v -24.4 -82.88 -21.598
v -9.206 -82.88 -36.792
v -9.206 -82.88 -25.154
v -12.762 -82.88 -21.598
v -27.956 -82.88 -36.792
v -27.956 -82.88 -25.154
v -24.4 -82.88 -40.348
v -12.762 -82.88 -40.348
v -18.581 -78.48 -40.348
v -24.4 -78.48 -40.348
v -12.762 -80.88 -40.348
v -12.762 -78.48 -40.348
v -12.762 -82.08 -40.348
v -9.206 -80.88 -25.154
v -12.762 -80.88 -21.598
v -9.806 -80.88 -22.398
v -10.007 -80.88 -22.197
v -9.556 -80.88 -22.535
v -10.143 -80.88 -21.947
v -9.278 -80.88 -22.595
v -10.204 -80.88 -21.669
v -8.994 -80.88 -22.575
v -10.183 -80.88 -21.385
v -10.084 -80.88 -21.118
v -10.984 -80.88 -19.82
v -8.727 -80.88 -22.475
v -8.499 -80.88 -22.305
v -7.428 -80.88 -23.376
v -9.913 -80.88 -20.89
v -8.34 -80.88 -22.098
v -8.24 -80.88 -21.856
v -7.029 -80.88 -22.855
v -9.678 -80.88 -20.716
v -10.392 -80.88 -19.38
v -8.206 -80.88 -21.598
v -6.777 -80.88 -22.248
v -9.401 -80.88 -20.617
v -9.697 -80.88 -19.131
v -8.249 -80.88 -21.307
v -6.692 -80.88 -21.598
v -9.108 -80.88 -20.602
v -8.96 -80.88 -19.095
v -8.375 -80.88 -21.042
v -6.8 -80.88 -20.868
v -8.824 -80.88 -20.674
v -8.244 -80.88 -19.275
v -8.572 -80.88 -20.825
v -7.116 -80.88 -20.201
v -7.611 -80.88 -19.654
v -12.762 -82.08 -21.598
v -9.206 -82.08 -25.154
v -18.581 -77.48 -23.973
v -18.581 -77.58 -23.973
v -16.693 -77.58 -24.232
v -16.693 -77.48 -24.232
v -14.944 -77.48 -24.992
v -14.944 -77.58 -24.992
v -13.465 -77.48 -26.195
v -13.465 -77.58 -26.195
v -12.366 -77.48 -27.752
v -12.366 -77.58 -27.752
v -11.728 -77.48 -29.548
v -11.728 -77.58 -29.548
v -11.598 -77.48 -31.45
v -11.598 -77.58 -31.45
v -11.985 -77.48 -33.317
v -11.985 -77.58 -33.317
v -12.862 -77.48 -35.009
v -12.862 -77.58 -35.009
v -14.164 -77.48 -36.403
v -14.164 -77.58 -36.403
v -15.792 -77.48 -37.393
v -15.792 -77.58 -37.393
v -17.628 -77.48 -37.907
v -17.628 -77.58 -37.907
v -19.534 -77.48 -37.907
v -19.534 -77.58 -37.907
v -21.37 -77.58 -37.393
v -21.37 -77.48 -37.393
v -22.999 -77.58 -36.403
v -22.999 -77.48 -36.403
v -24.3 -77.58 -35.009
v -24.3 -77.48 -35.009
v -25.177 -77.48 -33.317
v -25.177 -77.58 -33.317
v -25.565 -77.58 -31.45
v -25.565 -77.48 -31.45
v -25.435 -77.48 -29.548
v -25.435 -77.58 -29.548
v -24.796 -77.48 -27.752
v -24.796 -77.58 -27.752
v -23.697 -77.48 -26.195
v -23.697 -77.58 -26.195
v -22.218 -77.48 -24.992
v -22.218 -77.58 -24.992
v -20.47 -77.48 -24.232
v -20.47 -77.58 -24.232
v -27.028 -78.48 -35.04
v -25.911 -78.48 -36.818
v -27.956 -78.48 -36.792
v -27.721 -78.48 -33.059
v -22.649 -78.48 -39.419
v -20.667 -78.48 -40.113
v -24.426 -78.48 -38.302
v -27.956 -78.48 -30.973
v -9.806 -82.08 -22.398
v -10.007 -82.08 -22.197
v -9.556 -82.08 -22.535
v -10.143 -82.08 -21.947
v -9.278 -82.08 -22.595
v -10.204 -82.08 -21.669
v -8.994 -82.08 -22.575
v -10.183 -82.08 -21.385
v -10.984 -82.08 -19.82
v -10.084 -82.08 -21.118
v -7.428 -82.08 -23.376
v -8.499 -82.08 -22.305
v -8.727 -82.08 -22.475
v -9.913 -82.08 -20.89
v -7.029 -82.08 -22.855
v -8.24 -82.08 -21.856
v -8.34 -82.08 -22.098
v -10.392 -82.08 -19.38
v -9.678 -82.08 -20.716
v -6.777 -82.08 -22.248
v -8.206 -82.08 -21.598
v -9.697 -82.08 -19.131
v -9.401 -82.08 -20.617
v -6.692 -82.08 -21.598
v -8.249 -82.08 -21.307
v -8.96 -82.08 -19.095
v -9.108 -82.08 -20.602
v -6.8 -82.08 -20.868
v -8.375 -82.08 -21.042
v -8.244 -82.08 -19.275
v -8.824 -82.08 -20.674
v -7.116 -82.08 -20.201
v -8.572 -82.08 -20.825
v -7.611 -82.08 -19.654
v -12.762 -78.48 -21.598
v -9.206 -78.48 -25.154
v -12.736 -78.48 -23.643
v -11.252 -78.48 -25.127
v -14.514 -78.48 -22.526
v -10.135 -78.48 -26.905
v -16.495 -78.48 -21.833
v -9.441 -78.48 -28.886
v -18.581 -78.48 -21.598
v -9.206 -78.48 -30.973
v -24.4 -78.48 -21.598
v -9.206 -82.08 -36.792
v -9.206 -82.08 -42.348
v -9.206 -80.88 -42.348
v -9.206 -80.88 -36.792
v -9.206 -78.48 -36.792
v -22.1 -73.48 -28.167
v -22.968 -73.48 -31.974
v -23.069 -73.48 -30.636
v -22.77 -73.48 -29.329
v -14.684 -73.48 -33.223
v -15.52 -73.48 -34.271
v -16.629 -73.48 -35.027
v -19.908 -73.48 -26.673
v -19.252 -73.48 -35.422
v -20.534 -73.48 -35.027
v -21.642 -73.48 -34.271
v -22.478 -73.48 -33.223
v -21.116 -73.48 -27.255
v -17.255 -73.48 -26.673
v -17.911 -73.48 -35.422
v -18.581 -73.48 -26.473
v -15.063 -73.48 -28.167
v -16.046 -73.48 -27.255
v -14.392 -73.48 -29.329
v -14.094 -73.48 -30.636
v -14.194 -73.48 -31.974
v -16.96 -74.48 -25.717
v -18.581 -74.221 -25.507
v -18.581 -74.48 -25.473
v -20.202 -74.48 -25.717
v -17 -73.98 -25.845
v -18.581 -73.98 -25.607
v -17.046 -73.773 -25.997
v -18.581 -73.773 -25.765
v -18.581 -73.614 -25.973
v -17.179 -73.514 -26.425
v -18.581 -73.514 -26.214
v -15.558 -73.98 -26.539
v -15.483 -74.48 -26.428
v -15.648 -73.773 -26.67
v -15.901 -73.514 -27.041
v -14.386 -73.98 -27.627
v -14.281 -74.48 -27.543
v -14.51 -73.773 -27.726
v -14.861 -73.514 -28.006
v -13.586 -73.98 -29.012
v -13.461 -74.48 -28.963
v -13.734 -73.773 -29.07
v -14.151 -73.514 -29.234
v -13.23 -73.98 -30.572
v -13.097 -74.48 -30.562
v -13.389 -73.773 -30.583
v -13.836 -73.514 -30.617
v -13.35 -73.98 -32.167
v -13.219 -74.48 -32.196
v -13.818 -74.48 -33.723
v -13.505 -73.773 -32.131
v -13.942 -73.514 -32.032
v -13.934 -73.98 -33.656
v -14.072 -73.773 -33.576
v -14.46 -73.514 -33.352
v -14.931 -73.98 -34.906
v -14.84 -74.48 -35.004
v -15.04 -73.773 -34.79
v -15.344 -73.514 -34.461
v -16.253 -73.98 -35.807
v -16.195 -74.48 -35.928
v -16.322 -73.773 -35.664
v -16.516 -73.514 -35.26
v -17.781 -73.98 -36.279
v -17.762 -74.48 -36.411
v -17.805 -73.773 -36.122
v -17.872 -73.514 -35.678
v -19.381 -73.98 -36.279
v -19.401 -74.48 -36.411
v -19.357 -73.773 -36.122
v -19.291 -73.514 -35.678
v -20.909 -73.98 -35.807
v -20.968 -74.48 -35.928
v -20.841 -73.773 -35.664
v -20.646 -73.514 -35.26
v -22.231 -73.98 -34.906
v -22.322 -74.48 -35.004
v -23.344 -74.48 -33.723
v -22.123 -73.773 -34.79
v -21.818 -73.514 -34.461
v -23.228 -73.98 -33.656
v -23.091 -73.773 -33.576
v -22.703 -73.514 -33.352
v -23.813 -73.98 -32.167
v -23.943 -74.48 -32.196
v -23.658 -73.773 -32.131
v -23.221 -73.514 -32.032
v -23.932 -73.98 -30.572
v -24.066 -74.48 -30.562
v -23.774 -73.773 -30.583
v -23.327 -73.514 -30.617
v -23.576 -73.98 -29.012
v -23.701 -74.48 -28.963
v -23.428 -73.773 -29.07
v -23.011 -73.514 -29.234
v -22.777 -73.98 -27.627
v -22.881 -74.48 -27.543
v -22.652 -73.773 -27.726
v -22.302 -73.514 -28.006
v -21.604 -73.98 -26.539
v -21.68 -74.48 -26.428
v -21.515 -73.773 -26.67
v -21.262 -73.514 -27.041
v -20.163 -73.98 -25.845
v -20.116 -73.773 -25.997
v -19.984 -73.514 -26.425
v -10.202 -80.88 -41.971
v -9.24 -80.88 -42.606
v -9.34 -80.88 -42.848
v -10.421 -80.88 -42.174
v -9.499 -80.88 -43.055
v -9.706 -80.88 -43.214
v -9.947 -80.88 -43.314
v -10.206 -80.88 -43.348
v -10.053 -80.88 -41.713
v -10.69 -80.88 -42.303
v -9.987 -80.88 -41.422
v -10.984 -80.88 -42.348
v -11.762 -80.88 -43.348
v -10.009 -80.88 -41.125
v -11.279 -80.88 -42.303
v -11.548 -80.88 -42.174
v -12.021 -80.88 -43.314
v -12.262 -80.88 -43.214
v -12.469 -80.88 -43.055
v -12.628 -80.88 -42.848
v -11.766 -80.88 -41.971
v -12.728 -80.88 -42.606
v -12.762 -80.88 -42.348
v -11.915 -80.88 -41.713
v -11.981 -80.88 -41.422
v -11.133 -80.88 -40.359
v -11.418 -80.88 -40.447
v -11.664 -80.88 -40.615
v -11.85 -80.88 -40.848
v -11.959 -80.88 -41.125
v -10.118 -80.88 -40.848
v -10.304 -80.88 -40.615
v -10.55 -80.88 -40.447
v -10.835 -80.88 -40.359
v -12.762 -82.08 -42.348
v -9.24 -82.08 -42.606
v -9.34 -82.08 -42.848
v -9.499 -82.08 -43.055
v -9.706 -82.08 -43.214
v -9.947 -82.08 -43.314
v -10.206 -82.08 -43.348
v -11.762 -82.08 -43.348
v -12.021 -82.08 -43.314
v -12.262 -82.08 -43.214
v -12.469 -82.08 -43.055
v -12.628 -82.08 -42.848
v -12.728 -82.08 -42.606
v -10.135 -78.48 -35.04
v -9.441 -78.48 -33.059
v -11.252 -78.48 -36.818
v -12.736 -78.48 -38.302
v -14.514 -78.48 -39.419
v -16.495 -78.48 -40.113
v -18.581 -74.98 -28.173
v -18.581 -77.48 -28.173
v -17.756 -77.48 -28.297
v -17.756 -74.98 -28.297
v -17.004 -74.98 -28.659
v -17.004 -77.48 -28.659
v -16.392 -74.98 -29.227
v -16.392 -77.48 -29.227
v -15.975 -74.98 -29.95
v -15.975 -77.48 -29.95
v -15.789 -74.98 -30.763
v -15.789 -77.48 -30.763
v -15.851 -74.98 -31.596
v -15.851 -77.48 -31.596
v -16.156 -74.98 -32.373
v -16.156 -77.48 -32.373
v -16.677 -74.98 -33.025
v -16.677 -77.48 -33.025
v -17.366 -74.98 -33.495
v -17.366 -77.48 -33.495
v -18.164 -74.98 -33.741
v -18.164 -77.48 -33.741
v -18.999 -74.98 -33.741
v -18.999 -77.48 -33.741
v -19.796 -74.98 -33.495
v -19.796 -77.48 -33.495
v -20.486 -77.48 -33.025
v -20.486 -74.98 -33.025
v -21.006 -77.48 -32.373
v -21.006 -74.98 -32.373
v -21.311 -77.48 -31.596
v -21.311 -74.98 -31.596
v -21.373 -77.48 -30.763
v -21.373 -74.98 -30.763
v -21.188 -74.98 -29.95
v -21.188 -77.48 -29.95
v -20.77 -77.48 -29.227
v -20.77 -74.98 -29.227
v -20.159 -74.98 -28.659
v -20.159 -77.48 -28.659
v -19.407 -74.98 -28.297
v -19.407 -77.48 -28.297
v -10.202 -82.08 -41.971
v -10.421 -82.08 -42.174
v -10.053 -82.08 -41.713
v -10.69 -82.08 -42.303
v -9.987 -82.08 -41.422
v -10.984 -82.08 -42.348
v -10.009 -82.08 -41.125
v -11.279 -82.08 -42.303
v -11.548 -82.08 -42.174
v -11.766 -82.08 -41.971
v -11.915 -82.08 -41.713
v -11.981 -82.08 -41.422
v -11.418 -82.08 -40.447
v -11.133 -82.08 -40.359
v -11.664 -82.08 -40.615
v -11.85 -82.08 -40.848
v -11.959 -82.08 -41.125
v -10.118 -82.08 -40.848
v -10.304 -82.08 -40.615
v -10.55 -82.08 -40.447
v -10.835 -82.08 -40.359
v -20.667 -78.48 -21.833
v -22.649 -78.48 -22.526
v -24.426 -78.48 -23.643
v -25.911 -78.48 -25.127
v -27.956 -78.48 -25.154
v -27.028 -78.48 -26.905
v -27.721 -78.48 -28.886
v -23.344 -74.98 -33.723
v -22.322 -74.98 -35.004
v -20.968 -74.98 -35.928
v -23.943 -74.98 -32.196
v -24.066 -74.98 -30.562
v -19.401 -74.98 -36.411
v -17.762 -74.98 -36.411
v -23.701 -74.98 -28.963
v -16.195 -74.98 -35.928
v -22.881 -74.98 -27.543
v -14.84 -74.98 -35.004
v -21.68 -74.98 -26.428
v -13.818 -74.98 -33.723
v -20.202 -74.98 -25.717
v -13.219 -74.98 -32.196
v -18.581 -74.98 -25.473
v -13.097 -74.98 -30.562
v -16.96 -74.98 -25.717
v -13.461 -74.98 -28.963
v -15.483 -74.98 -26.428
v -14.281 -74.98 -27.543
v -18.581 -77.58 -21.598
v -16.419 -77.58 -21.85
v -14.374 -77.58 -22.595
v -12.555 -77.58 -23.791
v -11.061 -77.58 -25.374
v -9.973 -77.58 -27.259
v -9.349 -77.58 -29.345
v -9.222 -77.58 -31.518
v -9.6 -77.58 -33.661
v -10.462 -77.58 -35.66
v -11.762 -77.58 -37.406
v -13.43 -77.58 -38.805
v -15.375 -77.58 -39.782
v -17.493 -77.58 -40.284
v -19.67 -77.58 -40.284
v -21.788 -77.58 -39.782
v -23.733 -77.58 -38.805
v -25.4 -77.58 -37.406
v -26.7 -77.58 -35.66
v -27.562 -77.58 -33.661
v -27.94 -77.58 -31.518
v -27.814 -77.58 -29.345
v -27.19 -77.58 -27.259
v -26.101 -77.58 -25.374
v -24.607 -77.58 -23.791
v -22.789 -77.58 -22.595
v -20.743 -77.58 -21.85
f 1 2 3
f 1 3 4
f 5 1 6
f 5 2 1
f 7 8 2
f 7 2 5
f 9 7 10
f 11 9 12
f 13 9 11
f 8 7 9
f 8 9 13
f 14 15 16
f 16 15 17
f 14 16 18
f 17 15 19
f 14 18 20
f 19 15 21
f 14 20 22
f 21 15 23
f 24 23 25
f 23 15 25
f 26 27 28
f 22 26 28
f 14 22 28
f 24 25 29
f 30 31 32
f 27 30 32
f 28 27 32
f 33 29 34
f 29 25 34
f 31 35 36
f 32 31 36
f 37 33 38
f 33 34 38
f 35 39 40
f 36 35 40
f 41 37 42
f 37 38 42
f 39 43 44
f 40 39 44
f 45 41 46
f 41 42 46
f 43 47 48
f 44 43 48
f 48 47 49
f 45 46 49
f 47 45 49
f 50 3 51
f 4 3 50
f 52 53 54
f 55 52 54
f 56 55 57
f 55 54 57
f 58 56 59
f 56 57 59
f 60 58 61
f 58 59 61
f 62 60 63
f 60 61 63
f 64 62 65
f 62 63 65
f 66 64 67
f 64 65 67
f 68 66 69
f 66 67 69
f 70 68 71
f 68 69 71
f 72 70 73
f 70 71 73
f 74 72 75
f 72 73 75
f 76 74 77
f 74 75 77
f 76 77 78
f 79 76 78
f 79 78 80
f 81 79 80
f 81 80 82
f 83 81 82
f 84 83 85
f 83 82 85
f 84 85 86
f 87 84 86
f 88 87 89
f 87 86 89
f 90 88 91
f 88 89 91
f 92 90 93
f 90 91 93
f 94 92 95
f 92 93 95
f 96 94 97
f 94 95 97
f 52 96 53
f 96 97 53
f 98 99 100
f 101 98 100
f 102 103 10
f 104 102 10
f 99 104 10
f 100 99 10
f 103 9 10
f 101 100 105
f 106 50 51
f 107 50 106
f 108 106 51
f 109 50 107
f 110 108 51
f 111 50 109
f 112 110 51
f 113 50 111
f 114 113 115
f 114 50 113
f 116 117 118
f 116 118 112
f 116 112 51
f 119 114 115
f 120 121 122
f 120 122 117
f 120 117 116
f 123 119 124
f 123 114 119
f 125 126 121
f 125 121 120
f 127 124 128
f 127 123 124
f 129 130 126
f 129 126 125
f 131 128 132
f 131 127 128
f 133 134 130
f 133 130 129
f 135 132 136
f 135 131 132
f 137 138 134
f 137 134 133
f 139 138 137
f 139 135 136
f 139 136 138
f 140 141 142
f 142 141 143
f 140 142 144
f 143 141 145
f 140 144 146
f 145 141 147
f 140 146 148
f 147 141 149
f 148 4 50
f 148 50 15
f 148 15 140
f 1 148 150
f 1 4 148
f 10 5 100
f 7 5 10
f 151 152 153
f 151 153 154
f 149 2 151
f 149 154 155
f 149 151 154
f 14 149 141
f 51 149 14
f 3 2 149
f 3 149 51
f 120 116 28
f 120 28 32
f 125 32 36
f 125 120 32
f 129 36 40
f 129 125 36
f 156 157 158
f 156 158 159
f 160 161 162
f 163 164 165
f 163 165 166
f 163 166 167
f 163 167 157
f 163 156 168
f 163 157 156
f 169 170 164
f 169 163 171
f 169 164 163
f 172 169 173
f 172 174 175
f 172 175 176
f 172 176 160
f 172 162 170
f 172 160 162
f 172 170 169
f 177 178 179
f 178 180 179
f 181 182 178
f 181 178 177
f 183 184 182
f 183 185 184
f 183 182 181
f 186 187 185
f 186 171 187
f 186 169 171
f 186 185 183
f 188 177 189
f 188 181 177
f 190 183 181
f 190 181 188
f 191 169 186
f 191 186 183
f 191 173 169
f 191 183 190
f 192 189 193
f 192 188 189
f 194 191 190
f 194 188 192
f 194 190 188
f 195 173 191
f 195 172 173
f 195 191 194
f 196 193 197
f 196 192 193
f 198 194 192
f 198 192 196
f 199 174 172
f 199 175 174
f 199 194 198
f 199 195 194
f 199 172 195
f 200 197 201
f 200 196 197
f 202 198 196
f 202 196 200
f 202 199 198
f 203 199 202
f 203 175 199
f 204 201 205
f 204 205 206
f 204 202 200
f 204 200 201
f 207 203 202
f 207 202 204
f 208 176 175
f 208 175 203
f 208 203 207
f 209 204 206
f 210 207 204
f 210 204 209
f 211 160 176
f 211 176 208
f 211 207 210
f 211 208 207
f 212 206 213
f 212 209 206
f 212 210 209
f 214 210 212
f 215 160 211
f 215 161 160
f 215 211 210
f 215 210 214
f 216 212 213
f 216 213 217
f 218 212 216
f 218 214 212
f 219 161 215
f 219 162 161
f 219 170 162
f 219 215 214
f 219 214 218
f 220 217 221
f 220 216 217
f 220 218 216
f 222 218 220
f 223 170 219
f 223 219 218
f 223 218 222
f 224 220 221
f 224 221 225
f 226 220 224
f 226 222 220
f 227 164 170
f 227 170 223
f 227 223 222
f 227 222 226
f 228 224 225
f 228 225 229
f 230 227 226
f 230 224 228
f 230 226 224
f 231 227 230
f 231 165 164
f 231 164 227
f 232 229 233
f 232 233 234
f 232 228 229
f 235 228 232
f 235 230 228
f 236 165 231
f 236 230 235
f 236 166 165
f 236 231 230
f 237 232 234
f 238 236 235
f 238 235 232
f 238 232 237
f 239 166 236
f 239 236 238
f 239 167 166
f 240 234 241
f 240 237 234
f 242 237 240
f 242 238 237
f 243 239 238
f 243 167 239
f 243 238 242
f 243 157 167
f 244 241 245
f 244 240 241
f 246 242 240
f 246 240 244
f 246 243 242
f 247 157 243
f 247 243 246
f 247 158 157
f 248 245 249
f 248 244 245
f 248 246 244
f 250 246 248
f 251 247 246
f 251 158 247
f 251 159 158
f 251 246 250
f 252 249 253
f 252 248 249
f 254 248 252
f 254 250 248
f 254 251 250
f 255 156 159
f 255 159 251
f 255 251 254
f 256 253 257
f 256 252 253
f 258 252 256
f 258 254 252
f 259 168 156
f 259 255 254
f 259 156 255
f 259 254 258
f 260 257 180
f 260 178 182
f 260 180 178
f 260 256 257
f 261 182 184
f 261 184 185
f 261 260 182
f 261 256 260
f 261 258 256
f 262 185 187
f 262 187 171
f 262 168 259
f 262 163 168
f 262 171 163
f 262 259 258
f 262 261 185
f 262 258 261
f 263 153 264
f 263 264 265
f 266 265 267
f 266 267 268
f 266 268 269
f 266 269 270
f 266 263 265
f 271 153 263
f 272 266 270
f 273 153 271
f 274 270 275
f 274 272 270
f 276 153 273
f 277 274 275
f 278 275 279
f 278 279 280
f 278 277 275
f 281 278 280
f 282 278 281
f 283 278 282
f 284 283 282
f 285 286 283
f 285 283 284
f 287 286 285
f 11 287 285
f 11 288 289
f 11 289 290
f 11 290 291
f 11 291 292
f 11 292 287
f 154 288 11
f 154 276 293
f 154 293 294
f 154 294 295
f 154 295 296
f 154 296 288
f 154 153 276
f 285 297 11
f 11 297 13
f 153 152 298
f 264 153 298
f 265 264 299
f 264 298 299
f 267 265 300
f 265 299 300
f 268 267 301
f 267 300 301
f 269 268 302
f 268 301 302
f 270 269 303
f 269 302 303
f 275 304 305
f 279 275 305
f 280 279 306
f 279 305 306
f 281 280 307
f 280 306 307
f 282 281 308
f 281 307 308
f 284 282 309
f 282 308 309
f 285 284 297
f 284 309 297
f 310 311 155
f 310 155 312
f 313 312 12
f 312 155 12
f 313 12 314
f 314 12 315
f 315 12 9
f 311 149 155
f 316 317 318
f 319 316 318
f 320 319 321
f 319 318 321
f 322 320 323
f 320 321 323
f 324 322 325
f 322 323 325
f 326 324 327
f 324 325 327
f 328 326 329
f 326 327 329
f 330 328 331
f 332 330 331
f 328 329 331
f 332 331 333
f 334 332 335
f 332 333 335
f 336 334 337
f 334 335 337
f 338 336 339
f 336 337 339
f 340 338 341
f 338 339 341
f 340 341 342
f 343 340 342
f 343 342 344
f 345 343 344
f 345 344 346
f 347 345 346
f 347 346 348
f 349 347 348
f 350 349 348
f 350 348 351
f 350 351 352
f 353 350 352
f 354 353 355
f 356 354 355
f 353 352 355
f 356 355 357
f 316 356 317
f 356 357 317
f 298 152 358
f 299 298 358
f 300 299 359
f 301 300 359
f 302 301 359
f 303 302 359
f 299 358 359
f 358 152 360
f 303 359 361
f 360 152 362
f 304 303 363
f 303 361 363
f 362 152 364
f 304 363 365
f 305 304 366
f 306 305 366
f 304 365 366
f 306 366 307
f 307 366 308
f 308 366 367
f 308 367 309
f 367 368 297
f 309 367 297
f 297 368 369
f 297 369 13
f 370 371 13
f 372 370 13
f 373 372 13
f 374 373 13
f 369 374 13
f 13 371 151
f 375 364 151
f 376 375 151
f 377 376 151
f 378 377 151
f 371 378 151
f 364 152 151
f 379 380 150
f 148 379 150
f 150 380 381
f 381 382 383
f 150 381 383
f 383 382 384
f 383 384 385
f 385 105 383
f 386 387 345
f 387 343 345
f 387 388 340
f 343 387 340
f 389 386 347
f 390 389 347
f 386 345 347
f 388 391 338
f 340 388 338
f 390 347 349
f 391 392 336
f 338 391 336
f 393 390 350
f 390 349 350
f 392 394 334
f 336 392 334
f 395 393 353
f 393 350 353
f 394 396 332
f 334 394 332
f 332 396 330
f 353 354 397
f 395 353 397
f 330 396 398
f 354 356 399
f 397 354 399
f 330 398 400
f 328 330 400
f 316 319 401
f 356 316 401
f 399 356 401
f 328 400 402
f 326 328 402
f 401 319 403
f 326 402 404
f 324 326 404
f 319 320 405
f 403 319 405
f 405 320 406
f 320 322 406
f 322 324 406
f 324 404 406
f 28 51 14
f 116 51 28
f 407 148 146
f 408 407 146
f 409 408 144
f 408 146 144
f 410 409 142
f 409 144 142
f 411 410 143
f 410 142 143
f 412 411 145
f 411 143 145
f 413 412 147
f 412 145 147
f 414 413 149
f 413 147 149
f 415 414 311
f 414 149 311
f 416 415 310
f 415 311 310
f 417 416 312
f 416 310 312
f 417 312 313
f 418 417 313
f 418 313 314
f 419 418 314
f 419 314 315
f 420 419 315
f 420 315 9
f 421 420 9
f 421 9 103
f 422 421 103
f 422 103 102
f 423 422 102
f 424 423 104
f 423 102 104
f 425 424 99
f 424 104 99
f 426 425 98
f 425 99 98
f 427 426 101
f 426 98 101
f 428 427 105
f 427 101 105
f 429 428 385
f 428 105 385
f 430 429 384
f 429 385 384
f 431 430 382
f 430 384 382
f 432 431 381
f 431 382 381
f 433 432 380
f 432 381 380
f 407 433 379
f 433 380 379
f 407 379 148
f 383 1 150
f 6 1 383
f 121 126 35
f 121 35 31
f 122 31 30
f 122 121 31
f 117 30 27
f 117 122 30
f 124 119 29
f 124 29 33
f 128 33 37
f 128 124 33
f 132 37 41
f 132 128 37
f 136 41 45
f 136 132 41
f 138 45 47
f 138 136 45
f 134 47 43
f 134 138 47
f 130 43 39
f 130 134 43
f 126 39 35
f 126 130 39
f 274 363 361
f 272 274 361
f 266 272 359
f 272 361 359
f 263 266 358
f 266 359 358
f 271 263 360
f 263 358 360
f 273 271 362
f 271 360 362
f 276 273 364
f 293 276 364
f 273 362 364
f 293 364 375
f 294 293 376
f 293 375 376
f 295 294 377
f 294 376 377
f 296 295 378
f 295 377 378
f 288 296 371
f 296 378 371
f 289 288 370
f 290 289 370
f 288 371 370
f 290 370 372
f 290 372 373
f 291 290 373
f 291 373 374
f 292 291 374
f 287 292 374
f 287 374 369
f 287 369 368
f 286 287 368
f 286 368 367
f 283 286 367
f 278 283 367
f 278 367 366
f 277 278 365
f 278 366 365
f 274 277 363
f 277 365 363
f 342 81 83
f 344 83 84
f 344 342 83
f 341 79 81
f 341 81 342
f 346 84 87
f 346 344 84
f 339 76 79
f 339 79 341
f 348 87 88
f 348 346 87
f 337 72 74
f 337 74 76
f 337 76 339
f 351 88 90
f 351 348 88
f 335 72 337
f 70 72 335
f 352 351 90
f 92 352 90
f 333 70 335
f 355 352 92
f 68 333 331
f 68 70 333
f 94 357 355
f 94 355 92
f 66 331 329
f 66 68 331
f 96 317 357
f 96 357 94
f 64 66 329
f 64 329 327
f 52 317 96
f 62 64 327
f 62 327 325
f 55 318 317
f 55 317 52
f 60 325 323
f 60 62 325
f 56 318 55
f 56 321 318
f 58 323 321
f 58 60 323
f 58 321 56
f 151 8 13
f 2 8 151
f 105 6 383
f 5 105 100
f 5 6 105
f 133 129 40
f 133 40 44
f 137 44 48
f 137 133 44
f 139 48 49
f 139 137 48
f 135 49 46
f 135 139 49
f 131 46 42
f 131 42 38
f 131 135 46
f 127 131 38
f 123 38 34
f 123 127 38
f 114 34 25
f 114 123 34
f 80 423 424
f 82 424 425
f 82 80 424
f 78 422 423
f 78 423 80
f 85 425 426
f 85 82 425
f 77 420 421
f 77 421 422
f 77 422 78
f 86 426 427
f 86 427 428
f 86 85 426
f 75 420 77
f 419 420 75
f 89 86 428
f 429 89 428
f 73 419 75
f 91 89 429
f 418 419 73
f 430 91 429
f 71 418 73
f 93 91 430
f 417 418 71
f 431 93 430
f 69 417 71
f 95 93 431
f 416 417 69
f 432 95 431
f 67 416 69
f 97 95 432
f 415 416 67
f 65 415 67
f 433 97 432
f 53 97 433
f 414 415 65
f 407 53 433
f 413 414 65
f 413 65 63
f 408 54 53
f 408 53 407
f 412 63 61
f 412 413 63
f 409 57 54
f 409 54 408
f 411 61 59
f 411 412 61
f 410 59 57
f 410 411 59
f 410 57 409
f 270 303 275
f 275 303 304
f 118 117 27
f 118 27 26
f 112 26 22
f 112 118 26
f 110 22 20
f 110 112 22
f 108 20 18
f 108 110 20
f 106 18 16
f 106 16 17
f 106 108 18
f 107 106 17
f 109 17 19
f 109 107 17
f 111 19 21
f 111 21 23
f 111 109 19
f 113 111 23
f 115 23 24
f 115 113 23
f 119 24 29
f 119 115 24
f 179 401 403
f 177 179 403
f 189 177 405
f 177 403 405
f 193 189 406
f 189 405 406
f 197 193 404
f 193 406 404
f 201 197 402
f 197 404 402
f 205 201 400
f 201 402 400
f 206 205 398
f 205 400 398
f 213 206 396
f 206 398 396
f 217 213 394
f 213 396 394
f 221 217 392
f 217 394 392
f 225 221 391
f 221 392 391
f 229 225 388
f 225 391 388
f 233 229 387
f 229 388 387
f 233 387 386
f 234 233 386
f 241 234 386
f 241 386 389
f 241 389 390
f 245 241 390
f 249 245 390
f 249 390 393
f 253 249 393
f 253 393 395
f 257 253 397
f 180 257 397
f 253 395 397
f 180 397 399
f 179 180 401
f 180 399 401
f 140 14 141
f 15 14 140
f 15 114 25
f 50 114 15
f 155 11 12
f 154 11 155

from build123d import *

# Parameters (mm, degrees)
BOSS_EXTRUDE1_DEPTH = 4.4
SKETCH2_R           = 9.375
BOSS_EXTRUDE2_DEPTH = 0.9
SKETCH3_R           = 7
BOSS_EXTRUDE3_DEPTH = 0.1
SKETCH4_R           = 2.8
BOSS_EXTRUDE4_DEPTH = 2.5
SKETCH5_R           = 5.5
BOSS_EXTRUDE5_DEPTH = 1.5
FILLET1_R           = 1
BOSS_EXTRUDE6_START = -0.8
BOSS_EXTRUDE6_DEPTH = 1.2
SKETCH7_R           = 1
BOSS_EXTRUDE7_DEPTH = 1.2


with BuildPart() as part:
    # Sketch1 → Boss-Extrude1 (new body)
    with BuildSketch(Plane(origin=(-40.787368979, -82.87971859, -2.365032328), x_dir=(1, 0, 0), z_dir=(0, 1, 0))):
        Polygon((28.025105958, 37.98255848), (31.581105958, 34.42655848), (31.581105958, 22.78855848), (28.025105958, 19.23255848), (16.387105958, 19.23255848), (12.831105958, 22.78855848), (12.831105958, 34.42655848), (16.387105958, 37.98255848), align=None)
    extrude(amount=BOSS_EXTRUDE1_DEPTH)

    # Sketch2 → Boss-Extrude2 (add)
    with BuildSketch(Plane(origin=(0, -78.47971859, 0), x_dir=(1, 0, 0), z_dir=(0, 1, 0))):
        with Locations(Location((-18.581263021, 30.972590809, 0), (0, 0, 270))):
            Circle(SKETCH2_R)
    extrude(amount=BOSS_EXTRUDE2_DEPTH)

    # Sketch3 → Boss-Extrude3 (add)
    with BuildSketch(Plane(origin=(0, -77.57971859, 0), x_dir=(1, 0, 0), z_dir=(0, 1, 0))):
        with Locations(Location((-18.581263021, 30.972590809, 0), (0, 0, 270))):
            Circle(SKETCH3_R)
    extrude(amount=BOSS_EXTRUDE3_DEPTH)

    # Sketch4 → Boss-Extrude4 (add)
    with BuildSketch(Plane(origin=(0, -77.47971859, 0), x_dir=(1, 0, 0), z_dir=(0, 1, 0))):
        with Locations(Location((-18.581263021, 30.972590809, 0), (0, 0, 270))):
            Circle(SKETCH4_R)
    extrude(amount=BOSS_EXTRUDE4_DEPTH)

    # Sketch5 → Boss-Extrude5 (add)
    with BuildSketch(Plane(origin=(0, -74.97971859, 0), x_dir=(1, 0, 0), z_dir=(0, 1, 0))):
        with Locations(Location((-18.581263021, 30.972590809, 0), (0, 0, 270))):
            Circle(SKETCH5_R)
    extrude(amount=BOSS_EXTRUDE5_DEPTH)

    # Fillet1
    fillet1_edges = [part.edges().sort_by_distance(p)[0] for p in [
        (-18.581263021, -73.47971859, -36.472590809),
    ]]
    fillet(fillet1_edges, radius=FILLET1_R)

    # Sketch6 → Boss-Extrude6 (add)
    with BuildSketch(Plane.XZ.offset(82.87971859).offset(BOSS_EXTRUDE6_START)):
        with BuildLine():
            ThreePointArc((-6.691791307, -21.597590809), (-8.244016355, -19.274521857), (-10.984263021, -19.819590809))
            Line((-10.984263021, -19.819590809), (-9.913369802, -20.890484027))
            ThreePointArc((-9.913369802, -20.890484027), (-8.823579589, -20.673711276), (-8.206263021, -21.597590809))
            ThreePointArc((-8.206263021, -21.597590809), (-8.282383489, -21.980274241), (-8.49915624, -22.30469759))
            Line((-8.49915624, -22.30469759), (-7.428263021, -23.375590809))
            ThreePointArc((-7.428263021, -23.375590809), (-6.88319407, -22.559837475), (-6.691791307, -21.597590809))
        make_face()
        with BuildLine():
            Line((-9.913369802, -20.890484027), (-10.984263021, -19.819590809))
            ThreePointArc((-10.984263021, -19.819590809), (-11.720734735, -21.597590809), (-10.984263021, -23.375590809))
            ThreePointArc((-10.984263021, -23.375590809), (-9.206263021, -24.112062522), (-7.428263021, -23.375590809))
            Line((-7.428263021, -23.375590809), (-8.49915624, -22.30469759))
            ThreePointArc((-8.49915624, -22.30469759), (-9.913369802, -22.30469759), (-9.913369802, -20.890484027))
        make_face()
        with BuildLine():
            Line((-10.984263021, -19.819590809), (-12.762263021, -21.597590809))
            Line((-12.762263021, -21.597590809), (-10.984263021, -23.375590809))
            ThreePointArc((-10.984263021, -23.375590809), (-11.720734735, -21.597590809), (-10.984263021, -19.819590809))
        make_face()
        with BuildLine():
            ThreePointArc((-7.428263021, -23.375590809), (-9.206263021, -24.112062522), (-10.984263021, -23.375590809))
            Line((-10.984263021, -23.375590809), (-9.206263021, -25.153590809))
            Line((-9.206263021, -25.153590809), (-7.428263021, -23.375590809))
        make_face()
    extrude(amount=-BOSS_EXTRUDE6_DEPTH)

    # Sketch7 → Boss-Extrude7 (add)
    with BuildSketch(Plane.XZ.offset(82.07971859)):
        with BuildLine():
            Line((-9.206263021, -36.791590809), (-9.206263021, -42.347590809))
            ThreePointArc((-9.206263021, -42.347590809), (-9.49915624, -43.05469759), (-10.206263021, -43.347590809))
            Line((-10.206263021, -43.347590809), (-11.762263021, -43.347590809))
            ThreePointArc((-11.762263021, -43.347590809), (-12.469369802, -43.05469759), (-12.762263021, -42.347590809))
            Line((-12.762263021, -42.347590809), (-12.762263021, -40.347590809))
            Line((-12.762263021, -40.347590809), (-9.206263021, -36.791590809))
        make_face()
        with Locations(Location((-10.984263021, -41.347590809, 0), (0, 0, 270))):
            Circle(SKETCH7_R, mode=Mode.SUBTRACT)
    extrude(amount=-BOSS_EXTRUDE7_DEPTH)


solid = part.part
